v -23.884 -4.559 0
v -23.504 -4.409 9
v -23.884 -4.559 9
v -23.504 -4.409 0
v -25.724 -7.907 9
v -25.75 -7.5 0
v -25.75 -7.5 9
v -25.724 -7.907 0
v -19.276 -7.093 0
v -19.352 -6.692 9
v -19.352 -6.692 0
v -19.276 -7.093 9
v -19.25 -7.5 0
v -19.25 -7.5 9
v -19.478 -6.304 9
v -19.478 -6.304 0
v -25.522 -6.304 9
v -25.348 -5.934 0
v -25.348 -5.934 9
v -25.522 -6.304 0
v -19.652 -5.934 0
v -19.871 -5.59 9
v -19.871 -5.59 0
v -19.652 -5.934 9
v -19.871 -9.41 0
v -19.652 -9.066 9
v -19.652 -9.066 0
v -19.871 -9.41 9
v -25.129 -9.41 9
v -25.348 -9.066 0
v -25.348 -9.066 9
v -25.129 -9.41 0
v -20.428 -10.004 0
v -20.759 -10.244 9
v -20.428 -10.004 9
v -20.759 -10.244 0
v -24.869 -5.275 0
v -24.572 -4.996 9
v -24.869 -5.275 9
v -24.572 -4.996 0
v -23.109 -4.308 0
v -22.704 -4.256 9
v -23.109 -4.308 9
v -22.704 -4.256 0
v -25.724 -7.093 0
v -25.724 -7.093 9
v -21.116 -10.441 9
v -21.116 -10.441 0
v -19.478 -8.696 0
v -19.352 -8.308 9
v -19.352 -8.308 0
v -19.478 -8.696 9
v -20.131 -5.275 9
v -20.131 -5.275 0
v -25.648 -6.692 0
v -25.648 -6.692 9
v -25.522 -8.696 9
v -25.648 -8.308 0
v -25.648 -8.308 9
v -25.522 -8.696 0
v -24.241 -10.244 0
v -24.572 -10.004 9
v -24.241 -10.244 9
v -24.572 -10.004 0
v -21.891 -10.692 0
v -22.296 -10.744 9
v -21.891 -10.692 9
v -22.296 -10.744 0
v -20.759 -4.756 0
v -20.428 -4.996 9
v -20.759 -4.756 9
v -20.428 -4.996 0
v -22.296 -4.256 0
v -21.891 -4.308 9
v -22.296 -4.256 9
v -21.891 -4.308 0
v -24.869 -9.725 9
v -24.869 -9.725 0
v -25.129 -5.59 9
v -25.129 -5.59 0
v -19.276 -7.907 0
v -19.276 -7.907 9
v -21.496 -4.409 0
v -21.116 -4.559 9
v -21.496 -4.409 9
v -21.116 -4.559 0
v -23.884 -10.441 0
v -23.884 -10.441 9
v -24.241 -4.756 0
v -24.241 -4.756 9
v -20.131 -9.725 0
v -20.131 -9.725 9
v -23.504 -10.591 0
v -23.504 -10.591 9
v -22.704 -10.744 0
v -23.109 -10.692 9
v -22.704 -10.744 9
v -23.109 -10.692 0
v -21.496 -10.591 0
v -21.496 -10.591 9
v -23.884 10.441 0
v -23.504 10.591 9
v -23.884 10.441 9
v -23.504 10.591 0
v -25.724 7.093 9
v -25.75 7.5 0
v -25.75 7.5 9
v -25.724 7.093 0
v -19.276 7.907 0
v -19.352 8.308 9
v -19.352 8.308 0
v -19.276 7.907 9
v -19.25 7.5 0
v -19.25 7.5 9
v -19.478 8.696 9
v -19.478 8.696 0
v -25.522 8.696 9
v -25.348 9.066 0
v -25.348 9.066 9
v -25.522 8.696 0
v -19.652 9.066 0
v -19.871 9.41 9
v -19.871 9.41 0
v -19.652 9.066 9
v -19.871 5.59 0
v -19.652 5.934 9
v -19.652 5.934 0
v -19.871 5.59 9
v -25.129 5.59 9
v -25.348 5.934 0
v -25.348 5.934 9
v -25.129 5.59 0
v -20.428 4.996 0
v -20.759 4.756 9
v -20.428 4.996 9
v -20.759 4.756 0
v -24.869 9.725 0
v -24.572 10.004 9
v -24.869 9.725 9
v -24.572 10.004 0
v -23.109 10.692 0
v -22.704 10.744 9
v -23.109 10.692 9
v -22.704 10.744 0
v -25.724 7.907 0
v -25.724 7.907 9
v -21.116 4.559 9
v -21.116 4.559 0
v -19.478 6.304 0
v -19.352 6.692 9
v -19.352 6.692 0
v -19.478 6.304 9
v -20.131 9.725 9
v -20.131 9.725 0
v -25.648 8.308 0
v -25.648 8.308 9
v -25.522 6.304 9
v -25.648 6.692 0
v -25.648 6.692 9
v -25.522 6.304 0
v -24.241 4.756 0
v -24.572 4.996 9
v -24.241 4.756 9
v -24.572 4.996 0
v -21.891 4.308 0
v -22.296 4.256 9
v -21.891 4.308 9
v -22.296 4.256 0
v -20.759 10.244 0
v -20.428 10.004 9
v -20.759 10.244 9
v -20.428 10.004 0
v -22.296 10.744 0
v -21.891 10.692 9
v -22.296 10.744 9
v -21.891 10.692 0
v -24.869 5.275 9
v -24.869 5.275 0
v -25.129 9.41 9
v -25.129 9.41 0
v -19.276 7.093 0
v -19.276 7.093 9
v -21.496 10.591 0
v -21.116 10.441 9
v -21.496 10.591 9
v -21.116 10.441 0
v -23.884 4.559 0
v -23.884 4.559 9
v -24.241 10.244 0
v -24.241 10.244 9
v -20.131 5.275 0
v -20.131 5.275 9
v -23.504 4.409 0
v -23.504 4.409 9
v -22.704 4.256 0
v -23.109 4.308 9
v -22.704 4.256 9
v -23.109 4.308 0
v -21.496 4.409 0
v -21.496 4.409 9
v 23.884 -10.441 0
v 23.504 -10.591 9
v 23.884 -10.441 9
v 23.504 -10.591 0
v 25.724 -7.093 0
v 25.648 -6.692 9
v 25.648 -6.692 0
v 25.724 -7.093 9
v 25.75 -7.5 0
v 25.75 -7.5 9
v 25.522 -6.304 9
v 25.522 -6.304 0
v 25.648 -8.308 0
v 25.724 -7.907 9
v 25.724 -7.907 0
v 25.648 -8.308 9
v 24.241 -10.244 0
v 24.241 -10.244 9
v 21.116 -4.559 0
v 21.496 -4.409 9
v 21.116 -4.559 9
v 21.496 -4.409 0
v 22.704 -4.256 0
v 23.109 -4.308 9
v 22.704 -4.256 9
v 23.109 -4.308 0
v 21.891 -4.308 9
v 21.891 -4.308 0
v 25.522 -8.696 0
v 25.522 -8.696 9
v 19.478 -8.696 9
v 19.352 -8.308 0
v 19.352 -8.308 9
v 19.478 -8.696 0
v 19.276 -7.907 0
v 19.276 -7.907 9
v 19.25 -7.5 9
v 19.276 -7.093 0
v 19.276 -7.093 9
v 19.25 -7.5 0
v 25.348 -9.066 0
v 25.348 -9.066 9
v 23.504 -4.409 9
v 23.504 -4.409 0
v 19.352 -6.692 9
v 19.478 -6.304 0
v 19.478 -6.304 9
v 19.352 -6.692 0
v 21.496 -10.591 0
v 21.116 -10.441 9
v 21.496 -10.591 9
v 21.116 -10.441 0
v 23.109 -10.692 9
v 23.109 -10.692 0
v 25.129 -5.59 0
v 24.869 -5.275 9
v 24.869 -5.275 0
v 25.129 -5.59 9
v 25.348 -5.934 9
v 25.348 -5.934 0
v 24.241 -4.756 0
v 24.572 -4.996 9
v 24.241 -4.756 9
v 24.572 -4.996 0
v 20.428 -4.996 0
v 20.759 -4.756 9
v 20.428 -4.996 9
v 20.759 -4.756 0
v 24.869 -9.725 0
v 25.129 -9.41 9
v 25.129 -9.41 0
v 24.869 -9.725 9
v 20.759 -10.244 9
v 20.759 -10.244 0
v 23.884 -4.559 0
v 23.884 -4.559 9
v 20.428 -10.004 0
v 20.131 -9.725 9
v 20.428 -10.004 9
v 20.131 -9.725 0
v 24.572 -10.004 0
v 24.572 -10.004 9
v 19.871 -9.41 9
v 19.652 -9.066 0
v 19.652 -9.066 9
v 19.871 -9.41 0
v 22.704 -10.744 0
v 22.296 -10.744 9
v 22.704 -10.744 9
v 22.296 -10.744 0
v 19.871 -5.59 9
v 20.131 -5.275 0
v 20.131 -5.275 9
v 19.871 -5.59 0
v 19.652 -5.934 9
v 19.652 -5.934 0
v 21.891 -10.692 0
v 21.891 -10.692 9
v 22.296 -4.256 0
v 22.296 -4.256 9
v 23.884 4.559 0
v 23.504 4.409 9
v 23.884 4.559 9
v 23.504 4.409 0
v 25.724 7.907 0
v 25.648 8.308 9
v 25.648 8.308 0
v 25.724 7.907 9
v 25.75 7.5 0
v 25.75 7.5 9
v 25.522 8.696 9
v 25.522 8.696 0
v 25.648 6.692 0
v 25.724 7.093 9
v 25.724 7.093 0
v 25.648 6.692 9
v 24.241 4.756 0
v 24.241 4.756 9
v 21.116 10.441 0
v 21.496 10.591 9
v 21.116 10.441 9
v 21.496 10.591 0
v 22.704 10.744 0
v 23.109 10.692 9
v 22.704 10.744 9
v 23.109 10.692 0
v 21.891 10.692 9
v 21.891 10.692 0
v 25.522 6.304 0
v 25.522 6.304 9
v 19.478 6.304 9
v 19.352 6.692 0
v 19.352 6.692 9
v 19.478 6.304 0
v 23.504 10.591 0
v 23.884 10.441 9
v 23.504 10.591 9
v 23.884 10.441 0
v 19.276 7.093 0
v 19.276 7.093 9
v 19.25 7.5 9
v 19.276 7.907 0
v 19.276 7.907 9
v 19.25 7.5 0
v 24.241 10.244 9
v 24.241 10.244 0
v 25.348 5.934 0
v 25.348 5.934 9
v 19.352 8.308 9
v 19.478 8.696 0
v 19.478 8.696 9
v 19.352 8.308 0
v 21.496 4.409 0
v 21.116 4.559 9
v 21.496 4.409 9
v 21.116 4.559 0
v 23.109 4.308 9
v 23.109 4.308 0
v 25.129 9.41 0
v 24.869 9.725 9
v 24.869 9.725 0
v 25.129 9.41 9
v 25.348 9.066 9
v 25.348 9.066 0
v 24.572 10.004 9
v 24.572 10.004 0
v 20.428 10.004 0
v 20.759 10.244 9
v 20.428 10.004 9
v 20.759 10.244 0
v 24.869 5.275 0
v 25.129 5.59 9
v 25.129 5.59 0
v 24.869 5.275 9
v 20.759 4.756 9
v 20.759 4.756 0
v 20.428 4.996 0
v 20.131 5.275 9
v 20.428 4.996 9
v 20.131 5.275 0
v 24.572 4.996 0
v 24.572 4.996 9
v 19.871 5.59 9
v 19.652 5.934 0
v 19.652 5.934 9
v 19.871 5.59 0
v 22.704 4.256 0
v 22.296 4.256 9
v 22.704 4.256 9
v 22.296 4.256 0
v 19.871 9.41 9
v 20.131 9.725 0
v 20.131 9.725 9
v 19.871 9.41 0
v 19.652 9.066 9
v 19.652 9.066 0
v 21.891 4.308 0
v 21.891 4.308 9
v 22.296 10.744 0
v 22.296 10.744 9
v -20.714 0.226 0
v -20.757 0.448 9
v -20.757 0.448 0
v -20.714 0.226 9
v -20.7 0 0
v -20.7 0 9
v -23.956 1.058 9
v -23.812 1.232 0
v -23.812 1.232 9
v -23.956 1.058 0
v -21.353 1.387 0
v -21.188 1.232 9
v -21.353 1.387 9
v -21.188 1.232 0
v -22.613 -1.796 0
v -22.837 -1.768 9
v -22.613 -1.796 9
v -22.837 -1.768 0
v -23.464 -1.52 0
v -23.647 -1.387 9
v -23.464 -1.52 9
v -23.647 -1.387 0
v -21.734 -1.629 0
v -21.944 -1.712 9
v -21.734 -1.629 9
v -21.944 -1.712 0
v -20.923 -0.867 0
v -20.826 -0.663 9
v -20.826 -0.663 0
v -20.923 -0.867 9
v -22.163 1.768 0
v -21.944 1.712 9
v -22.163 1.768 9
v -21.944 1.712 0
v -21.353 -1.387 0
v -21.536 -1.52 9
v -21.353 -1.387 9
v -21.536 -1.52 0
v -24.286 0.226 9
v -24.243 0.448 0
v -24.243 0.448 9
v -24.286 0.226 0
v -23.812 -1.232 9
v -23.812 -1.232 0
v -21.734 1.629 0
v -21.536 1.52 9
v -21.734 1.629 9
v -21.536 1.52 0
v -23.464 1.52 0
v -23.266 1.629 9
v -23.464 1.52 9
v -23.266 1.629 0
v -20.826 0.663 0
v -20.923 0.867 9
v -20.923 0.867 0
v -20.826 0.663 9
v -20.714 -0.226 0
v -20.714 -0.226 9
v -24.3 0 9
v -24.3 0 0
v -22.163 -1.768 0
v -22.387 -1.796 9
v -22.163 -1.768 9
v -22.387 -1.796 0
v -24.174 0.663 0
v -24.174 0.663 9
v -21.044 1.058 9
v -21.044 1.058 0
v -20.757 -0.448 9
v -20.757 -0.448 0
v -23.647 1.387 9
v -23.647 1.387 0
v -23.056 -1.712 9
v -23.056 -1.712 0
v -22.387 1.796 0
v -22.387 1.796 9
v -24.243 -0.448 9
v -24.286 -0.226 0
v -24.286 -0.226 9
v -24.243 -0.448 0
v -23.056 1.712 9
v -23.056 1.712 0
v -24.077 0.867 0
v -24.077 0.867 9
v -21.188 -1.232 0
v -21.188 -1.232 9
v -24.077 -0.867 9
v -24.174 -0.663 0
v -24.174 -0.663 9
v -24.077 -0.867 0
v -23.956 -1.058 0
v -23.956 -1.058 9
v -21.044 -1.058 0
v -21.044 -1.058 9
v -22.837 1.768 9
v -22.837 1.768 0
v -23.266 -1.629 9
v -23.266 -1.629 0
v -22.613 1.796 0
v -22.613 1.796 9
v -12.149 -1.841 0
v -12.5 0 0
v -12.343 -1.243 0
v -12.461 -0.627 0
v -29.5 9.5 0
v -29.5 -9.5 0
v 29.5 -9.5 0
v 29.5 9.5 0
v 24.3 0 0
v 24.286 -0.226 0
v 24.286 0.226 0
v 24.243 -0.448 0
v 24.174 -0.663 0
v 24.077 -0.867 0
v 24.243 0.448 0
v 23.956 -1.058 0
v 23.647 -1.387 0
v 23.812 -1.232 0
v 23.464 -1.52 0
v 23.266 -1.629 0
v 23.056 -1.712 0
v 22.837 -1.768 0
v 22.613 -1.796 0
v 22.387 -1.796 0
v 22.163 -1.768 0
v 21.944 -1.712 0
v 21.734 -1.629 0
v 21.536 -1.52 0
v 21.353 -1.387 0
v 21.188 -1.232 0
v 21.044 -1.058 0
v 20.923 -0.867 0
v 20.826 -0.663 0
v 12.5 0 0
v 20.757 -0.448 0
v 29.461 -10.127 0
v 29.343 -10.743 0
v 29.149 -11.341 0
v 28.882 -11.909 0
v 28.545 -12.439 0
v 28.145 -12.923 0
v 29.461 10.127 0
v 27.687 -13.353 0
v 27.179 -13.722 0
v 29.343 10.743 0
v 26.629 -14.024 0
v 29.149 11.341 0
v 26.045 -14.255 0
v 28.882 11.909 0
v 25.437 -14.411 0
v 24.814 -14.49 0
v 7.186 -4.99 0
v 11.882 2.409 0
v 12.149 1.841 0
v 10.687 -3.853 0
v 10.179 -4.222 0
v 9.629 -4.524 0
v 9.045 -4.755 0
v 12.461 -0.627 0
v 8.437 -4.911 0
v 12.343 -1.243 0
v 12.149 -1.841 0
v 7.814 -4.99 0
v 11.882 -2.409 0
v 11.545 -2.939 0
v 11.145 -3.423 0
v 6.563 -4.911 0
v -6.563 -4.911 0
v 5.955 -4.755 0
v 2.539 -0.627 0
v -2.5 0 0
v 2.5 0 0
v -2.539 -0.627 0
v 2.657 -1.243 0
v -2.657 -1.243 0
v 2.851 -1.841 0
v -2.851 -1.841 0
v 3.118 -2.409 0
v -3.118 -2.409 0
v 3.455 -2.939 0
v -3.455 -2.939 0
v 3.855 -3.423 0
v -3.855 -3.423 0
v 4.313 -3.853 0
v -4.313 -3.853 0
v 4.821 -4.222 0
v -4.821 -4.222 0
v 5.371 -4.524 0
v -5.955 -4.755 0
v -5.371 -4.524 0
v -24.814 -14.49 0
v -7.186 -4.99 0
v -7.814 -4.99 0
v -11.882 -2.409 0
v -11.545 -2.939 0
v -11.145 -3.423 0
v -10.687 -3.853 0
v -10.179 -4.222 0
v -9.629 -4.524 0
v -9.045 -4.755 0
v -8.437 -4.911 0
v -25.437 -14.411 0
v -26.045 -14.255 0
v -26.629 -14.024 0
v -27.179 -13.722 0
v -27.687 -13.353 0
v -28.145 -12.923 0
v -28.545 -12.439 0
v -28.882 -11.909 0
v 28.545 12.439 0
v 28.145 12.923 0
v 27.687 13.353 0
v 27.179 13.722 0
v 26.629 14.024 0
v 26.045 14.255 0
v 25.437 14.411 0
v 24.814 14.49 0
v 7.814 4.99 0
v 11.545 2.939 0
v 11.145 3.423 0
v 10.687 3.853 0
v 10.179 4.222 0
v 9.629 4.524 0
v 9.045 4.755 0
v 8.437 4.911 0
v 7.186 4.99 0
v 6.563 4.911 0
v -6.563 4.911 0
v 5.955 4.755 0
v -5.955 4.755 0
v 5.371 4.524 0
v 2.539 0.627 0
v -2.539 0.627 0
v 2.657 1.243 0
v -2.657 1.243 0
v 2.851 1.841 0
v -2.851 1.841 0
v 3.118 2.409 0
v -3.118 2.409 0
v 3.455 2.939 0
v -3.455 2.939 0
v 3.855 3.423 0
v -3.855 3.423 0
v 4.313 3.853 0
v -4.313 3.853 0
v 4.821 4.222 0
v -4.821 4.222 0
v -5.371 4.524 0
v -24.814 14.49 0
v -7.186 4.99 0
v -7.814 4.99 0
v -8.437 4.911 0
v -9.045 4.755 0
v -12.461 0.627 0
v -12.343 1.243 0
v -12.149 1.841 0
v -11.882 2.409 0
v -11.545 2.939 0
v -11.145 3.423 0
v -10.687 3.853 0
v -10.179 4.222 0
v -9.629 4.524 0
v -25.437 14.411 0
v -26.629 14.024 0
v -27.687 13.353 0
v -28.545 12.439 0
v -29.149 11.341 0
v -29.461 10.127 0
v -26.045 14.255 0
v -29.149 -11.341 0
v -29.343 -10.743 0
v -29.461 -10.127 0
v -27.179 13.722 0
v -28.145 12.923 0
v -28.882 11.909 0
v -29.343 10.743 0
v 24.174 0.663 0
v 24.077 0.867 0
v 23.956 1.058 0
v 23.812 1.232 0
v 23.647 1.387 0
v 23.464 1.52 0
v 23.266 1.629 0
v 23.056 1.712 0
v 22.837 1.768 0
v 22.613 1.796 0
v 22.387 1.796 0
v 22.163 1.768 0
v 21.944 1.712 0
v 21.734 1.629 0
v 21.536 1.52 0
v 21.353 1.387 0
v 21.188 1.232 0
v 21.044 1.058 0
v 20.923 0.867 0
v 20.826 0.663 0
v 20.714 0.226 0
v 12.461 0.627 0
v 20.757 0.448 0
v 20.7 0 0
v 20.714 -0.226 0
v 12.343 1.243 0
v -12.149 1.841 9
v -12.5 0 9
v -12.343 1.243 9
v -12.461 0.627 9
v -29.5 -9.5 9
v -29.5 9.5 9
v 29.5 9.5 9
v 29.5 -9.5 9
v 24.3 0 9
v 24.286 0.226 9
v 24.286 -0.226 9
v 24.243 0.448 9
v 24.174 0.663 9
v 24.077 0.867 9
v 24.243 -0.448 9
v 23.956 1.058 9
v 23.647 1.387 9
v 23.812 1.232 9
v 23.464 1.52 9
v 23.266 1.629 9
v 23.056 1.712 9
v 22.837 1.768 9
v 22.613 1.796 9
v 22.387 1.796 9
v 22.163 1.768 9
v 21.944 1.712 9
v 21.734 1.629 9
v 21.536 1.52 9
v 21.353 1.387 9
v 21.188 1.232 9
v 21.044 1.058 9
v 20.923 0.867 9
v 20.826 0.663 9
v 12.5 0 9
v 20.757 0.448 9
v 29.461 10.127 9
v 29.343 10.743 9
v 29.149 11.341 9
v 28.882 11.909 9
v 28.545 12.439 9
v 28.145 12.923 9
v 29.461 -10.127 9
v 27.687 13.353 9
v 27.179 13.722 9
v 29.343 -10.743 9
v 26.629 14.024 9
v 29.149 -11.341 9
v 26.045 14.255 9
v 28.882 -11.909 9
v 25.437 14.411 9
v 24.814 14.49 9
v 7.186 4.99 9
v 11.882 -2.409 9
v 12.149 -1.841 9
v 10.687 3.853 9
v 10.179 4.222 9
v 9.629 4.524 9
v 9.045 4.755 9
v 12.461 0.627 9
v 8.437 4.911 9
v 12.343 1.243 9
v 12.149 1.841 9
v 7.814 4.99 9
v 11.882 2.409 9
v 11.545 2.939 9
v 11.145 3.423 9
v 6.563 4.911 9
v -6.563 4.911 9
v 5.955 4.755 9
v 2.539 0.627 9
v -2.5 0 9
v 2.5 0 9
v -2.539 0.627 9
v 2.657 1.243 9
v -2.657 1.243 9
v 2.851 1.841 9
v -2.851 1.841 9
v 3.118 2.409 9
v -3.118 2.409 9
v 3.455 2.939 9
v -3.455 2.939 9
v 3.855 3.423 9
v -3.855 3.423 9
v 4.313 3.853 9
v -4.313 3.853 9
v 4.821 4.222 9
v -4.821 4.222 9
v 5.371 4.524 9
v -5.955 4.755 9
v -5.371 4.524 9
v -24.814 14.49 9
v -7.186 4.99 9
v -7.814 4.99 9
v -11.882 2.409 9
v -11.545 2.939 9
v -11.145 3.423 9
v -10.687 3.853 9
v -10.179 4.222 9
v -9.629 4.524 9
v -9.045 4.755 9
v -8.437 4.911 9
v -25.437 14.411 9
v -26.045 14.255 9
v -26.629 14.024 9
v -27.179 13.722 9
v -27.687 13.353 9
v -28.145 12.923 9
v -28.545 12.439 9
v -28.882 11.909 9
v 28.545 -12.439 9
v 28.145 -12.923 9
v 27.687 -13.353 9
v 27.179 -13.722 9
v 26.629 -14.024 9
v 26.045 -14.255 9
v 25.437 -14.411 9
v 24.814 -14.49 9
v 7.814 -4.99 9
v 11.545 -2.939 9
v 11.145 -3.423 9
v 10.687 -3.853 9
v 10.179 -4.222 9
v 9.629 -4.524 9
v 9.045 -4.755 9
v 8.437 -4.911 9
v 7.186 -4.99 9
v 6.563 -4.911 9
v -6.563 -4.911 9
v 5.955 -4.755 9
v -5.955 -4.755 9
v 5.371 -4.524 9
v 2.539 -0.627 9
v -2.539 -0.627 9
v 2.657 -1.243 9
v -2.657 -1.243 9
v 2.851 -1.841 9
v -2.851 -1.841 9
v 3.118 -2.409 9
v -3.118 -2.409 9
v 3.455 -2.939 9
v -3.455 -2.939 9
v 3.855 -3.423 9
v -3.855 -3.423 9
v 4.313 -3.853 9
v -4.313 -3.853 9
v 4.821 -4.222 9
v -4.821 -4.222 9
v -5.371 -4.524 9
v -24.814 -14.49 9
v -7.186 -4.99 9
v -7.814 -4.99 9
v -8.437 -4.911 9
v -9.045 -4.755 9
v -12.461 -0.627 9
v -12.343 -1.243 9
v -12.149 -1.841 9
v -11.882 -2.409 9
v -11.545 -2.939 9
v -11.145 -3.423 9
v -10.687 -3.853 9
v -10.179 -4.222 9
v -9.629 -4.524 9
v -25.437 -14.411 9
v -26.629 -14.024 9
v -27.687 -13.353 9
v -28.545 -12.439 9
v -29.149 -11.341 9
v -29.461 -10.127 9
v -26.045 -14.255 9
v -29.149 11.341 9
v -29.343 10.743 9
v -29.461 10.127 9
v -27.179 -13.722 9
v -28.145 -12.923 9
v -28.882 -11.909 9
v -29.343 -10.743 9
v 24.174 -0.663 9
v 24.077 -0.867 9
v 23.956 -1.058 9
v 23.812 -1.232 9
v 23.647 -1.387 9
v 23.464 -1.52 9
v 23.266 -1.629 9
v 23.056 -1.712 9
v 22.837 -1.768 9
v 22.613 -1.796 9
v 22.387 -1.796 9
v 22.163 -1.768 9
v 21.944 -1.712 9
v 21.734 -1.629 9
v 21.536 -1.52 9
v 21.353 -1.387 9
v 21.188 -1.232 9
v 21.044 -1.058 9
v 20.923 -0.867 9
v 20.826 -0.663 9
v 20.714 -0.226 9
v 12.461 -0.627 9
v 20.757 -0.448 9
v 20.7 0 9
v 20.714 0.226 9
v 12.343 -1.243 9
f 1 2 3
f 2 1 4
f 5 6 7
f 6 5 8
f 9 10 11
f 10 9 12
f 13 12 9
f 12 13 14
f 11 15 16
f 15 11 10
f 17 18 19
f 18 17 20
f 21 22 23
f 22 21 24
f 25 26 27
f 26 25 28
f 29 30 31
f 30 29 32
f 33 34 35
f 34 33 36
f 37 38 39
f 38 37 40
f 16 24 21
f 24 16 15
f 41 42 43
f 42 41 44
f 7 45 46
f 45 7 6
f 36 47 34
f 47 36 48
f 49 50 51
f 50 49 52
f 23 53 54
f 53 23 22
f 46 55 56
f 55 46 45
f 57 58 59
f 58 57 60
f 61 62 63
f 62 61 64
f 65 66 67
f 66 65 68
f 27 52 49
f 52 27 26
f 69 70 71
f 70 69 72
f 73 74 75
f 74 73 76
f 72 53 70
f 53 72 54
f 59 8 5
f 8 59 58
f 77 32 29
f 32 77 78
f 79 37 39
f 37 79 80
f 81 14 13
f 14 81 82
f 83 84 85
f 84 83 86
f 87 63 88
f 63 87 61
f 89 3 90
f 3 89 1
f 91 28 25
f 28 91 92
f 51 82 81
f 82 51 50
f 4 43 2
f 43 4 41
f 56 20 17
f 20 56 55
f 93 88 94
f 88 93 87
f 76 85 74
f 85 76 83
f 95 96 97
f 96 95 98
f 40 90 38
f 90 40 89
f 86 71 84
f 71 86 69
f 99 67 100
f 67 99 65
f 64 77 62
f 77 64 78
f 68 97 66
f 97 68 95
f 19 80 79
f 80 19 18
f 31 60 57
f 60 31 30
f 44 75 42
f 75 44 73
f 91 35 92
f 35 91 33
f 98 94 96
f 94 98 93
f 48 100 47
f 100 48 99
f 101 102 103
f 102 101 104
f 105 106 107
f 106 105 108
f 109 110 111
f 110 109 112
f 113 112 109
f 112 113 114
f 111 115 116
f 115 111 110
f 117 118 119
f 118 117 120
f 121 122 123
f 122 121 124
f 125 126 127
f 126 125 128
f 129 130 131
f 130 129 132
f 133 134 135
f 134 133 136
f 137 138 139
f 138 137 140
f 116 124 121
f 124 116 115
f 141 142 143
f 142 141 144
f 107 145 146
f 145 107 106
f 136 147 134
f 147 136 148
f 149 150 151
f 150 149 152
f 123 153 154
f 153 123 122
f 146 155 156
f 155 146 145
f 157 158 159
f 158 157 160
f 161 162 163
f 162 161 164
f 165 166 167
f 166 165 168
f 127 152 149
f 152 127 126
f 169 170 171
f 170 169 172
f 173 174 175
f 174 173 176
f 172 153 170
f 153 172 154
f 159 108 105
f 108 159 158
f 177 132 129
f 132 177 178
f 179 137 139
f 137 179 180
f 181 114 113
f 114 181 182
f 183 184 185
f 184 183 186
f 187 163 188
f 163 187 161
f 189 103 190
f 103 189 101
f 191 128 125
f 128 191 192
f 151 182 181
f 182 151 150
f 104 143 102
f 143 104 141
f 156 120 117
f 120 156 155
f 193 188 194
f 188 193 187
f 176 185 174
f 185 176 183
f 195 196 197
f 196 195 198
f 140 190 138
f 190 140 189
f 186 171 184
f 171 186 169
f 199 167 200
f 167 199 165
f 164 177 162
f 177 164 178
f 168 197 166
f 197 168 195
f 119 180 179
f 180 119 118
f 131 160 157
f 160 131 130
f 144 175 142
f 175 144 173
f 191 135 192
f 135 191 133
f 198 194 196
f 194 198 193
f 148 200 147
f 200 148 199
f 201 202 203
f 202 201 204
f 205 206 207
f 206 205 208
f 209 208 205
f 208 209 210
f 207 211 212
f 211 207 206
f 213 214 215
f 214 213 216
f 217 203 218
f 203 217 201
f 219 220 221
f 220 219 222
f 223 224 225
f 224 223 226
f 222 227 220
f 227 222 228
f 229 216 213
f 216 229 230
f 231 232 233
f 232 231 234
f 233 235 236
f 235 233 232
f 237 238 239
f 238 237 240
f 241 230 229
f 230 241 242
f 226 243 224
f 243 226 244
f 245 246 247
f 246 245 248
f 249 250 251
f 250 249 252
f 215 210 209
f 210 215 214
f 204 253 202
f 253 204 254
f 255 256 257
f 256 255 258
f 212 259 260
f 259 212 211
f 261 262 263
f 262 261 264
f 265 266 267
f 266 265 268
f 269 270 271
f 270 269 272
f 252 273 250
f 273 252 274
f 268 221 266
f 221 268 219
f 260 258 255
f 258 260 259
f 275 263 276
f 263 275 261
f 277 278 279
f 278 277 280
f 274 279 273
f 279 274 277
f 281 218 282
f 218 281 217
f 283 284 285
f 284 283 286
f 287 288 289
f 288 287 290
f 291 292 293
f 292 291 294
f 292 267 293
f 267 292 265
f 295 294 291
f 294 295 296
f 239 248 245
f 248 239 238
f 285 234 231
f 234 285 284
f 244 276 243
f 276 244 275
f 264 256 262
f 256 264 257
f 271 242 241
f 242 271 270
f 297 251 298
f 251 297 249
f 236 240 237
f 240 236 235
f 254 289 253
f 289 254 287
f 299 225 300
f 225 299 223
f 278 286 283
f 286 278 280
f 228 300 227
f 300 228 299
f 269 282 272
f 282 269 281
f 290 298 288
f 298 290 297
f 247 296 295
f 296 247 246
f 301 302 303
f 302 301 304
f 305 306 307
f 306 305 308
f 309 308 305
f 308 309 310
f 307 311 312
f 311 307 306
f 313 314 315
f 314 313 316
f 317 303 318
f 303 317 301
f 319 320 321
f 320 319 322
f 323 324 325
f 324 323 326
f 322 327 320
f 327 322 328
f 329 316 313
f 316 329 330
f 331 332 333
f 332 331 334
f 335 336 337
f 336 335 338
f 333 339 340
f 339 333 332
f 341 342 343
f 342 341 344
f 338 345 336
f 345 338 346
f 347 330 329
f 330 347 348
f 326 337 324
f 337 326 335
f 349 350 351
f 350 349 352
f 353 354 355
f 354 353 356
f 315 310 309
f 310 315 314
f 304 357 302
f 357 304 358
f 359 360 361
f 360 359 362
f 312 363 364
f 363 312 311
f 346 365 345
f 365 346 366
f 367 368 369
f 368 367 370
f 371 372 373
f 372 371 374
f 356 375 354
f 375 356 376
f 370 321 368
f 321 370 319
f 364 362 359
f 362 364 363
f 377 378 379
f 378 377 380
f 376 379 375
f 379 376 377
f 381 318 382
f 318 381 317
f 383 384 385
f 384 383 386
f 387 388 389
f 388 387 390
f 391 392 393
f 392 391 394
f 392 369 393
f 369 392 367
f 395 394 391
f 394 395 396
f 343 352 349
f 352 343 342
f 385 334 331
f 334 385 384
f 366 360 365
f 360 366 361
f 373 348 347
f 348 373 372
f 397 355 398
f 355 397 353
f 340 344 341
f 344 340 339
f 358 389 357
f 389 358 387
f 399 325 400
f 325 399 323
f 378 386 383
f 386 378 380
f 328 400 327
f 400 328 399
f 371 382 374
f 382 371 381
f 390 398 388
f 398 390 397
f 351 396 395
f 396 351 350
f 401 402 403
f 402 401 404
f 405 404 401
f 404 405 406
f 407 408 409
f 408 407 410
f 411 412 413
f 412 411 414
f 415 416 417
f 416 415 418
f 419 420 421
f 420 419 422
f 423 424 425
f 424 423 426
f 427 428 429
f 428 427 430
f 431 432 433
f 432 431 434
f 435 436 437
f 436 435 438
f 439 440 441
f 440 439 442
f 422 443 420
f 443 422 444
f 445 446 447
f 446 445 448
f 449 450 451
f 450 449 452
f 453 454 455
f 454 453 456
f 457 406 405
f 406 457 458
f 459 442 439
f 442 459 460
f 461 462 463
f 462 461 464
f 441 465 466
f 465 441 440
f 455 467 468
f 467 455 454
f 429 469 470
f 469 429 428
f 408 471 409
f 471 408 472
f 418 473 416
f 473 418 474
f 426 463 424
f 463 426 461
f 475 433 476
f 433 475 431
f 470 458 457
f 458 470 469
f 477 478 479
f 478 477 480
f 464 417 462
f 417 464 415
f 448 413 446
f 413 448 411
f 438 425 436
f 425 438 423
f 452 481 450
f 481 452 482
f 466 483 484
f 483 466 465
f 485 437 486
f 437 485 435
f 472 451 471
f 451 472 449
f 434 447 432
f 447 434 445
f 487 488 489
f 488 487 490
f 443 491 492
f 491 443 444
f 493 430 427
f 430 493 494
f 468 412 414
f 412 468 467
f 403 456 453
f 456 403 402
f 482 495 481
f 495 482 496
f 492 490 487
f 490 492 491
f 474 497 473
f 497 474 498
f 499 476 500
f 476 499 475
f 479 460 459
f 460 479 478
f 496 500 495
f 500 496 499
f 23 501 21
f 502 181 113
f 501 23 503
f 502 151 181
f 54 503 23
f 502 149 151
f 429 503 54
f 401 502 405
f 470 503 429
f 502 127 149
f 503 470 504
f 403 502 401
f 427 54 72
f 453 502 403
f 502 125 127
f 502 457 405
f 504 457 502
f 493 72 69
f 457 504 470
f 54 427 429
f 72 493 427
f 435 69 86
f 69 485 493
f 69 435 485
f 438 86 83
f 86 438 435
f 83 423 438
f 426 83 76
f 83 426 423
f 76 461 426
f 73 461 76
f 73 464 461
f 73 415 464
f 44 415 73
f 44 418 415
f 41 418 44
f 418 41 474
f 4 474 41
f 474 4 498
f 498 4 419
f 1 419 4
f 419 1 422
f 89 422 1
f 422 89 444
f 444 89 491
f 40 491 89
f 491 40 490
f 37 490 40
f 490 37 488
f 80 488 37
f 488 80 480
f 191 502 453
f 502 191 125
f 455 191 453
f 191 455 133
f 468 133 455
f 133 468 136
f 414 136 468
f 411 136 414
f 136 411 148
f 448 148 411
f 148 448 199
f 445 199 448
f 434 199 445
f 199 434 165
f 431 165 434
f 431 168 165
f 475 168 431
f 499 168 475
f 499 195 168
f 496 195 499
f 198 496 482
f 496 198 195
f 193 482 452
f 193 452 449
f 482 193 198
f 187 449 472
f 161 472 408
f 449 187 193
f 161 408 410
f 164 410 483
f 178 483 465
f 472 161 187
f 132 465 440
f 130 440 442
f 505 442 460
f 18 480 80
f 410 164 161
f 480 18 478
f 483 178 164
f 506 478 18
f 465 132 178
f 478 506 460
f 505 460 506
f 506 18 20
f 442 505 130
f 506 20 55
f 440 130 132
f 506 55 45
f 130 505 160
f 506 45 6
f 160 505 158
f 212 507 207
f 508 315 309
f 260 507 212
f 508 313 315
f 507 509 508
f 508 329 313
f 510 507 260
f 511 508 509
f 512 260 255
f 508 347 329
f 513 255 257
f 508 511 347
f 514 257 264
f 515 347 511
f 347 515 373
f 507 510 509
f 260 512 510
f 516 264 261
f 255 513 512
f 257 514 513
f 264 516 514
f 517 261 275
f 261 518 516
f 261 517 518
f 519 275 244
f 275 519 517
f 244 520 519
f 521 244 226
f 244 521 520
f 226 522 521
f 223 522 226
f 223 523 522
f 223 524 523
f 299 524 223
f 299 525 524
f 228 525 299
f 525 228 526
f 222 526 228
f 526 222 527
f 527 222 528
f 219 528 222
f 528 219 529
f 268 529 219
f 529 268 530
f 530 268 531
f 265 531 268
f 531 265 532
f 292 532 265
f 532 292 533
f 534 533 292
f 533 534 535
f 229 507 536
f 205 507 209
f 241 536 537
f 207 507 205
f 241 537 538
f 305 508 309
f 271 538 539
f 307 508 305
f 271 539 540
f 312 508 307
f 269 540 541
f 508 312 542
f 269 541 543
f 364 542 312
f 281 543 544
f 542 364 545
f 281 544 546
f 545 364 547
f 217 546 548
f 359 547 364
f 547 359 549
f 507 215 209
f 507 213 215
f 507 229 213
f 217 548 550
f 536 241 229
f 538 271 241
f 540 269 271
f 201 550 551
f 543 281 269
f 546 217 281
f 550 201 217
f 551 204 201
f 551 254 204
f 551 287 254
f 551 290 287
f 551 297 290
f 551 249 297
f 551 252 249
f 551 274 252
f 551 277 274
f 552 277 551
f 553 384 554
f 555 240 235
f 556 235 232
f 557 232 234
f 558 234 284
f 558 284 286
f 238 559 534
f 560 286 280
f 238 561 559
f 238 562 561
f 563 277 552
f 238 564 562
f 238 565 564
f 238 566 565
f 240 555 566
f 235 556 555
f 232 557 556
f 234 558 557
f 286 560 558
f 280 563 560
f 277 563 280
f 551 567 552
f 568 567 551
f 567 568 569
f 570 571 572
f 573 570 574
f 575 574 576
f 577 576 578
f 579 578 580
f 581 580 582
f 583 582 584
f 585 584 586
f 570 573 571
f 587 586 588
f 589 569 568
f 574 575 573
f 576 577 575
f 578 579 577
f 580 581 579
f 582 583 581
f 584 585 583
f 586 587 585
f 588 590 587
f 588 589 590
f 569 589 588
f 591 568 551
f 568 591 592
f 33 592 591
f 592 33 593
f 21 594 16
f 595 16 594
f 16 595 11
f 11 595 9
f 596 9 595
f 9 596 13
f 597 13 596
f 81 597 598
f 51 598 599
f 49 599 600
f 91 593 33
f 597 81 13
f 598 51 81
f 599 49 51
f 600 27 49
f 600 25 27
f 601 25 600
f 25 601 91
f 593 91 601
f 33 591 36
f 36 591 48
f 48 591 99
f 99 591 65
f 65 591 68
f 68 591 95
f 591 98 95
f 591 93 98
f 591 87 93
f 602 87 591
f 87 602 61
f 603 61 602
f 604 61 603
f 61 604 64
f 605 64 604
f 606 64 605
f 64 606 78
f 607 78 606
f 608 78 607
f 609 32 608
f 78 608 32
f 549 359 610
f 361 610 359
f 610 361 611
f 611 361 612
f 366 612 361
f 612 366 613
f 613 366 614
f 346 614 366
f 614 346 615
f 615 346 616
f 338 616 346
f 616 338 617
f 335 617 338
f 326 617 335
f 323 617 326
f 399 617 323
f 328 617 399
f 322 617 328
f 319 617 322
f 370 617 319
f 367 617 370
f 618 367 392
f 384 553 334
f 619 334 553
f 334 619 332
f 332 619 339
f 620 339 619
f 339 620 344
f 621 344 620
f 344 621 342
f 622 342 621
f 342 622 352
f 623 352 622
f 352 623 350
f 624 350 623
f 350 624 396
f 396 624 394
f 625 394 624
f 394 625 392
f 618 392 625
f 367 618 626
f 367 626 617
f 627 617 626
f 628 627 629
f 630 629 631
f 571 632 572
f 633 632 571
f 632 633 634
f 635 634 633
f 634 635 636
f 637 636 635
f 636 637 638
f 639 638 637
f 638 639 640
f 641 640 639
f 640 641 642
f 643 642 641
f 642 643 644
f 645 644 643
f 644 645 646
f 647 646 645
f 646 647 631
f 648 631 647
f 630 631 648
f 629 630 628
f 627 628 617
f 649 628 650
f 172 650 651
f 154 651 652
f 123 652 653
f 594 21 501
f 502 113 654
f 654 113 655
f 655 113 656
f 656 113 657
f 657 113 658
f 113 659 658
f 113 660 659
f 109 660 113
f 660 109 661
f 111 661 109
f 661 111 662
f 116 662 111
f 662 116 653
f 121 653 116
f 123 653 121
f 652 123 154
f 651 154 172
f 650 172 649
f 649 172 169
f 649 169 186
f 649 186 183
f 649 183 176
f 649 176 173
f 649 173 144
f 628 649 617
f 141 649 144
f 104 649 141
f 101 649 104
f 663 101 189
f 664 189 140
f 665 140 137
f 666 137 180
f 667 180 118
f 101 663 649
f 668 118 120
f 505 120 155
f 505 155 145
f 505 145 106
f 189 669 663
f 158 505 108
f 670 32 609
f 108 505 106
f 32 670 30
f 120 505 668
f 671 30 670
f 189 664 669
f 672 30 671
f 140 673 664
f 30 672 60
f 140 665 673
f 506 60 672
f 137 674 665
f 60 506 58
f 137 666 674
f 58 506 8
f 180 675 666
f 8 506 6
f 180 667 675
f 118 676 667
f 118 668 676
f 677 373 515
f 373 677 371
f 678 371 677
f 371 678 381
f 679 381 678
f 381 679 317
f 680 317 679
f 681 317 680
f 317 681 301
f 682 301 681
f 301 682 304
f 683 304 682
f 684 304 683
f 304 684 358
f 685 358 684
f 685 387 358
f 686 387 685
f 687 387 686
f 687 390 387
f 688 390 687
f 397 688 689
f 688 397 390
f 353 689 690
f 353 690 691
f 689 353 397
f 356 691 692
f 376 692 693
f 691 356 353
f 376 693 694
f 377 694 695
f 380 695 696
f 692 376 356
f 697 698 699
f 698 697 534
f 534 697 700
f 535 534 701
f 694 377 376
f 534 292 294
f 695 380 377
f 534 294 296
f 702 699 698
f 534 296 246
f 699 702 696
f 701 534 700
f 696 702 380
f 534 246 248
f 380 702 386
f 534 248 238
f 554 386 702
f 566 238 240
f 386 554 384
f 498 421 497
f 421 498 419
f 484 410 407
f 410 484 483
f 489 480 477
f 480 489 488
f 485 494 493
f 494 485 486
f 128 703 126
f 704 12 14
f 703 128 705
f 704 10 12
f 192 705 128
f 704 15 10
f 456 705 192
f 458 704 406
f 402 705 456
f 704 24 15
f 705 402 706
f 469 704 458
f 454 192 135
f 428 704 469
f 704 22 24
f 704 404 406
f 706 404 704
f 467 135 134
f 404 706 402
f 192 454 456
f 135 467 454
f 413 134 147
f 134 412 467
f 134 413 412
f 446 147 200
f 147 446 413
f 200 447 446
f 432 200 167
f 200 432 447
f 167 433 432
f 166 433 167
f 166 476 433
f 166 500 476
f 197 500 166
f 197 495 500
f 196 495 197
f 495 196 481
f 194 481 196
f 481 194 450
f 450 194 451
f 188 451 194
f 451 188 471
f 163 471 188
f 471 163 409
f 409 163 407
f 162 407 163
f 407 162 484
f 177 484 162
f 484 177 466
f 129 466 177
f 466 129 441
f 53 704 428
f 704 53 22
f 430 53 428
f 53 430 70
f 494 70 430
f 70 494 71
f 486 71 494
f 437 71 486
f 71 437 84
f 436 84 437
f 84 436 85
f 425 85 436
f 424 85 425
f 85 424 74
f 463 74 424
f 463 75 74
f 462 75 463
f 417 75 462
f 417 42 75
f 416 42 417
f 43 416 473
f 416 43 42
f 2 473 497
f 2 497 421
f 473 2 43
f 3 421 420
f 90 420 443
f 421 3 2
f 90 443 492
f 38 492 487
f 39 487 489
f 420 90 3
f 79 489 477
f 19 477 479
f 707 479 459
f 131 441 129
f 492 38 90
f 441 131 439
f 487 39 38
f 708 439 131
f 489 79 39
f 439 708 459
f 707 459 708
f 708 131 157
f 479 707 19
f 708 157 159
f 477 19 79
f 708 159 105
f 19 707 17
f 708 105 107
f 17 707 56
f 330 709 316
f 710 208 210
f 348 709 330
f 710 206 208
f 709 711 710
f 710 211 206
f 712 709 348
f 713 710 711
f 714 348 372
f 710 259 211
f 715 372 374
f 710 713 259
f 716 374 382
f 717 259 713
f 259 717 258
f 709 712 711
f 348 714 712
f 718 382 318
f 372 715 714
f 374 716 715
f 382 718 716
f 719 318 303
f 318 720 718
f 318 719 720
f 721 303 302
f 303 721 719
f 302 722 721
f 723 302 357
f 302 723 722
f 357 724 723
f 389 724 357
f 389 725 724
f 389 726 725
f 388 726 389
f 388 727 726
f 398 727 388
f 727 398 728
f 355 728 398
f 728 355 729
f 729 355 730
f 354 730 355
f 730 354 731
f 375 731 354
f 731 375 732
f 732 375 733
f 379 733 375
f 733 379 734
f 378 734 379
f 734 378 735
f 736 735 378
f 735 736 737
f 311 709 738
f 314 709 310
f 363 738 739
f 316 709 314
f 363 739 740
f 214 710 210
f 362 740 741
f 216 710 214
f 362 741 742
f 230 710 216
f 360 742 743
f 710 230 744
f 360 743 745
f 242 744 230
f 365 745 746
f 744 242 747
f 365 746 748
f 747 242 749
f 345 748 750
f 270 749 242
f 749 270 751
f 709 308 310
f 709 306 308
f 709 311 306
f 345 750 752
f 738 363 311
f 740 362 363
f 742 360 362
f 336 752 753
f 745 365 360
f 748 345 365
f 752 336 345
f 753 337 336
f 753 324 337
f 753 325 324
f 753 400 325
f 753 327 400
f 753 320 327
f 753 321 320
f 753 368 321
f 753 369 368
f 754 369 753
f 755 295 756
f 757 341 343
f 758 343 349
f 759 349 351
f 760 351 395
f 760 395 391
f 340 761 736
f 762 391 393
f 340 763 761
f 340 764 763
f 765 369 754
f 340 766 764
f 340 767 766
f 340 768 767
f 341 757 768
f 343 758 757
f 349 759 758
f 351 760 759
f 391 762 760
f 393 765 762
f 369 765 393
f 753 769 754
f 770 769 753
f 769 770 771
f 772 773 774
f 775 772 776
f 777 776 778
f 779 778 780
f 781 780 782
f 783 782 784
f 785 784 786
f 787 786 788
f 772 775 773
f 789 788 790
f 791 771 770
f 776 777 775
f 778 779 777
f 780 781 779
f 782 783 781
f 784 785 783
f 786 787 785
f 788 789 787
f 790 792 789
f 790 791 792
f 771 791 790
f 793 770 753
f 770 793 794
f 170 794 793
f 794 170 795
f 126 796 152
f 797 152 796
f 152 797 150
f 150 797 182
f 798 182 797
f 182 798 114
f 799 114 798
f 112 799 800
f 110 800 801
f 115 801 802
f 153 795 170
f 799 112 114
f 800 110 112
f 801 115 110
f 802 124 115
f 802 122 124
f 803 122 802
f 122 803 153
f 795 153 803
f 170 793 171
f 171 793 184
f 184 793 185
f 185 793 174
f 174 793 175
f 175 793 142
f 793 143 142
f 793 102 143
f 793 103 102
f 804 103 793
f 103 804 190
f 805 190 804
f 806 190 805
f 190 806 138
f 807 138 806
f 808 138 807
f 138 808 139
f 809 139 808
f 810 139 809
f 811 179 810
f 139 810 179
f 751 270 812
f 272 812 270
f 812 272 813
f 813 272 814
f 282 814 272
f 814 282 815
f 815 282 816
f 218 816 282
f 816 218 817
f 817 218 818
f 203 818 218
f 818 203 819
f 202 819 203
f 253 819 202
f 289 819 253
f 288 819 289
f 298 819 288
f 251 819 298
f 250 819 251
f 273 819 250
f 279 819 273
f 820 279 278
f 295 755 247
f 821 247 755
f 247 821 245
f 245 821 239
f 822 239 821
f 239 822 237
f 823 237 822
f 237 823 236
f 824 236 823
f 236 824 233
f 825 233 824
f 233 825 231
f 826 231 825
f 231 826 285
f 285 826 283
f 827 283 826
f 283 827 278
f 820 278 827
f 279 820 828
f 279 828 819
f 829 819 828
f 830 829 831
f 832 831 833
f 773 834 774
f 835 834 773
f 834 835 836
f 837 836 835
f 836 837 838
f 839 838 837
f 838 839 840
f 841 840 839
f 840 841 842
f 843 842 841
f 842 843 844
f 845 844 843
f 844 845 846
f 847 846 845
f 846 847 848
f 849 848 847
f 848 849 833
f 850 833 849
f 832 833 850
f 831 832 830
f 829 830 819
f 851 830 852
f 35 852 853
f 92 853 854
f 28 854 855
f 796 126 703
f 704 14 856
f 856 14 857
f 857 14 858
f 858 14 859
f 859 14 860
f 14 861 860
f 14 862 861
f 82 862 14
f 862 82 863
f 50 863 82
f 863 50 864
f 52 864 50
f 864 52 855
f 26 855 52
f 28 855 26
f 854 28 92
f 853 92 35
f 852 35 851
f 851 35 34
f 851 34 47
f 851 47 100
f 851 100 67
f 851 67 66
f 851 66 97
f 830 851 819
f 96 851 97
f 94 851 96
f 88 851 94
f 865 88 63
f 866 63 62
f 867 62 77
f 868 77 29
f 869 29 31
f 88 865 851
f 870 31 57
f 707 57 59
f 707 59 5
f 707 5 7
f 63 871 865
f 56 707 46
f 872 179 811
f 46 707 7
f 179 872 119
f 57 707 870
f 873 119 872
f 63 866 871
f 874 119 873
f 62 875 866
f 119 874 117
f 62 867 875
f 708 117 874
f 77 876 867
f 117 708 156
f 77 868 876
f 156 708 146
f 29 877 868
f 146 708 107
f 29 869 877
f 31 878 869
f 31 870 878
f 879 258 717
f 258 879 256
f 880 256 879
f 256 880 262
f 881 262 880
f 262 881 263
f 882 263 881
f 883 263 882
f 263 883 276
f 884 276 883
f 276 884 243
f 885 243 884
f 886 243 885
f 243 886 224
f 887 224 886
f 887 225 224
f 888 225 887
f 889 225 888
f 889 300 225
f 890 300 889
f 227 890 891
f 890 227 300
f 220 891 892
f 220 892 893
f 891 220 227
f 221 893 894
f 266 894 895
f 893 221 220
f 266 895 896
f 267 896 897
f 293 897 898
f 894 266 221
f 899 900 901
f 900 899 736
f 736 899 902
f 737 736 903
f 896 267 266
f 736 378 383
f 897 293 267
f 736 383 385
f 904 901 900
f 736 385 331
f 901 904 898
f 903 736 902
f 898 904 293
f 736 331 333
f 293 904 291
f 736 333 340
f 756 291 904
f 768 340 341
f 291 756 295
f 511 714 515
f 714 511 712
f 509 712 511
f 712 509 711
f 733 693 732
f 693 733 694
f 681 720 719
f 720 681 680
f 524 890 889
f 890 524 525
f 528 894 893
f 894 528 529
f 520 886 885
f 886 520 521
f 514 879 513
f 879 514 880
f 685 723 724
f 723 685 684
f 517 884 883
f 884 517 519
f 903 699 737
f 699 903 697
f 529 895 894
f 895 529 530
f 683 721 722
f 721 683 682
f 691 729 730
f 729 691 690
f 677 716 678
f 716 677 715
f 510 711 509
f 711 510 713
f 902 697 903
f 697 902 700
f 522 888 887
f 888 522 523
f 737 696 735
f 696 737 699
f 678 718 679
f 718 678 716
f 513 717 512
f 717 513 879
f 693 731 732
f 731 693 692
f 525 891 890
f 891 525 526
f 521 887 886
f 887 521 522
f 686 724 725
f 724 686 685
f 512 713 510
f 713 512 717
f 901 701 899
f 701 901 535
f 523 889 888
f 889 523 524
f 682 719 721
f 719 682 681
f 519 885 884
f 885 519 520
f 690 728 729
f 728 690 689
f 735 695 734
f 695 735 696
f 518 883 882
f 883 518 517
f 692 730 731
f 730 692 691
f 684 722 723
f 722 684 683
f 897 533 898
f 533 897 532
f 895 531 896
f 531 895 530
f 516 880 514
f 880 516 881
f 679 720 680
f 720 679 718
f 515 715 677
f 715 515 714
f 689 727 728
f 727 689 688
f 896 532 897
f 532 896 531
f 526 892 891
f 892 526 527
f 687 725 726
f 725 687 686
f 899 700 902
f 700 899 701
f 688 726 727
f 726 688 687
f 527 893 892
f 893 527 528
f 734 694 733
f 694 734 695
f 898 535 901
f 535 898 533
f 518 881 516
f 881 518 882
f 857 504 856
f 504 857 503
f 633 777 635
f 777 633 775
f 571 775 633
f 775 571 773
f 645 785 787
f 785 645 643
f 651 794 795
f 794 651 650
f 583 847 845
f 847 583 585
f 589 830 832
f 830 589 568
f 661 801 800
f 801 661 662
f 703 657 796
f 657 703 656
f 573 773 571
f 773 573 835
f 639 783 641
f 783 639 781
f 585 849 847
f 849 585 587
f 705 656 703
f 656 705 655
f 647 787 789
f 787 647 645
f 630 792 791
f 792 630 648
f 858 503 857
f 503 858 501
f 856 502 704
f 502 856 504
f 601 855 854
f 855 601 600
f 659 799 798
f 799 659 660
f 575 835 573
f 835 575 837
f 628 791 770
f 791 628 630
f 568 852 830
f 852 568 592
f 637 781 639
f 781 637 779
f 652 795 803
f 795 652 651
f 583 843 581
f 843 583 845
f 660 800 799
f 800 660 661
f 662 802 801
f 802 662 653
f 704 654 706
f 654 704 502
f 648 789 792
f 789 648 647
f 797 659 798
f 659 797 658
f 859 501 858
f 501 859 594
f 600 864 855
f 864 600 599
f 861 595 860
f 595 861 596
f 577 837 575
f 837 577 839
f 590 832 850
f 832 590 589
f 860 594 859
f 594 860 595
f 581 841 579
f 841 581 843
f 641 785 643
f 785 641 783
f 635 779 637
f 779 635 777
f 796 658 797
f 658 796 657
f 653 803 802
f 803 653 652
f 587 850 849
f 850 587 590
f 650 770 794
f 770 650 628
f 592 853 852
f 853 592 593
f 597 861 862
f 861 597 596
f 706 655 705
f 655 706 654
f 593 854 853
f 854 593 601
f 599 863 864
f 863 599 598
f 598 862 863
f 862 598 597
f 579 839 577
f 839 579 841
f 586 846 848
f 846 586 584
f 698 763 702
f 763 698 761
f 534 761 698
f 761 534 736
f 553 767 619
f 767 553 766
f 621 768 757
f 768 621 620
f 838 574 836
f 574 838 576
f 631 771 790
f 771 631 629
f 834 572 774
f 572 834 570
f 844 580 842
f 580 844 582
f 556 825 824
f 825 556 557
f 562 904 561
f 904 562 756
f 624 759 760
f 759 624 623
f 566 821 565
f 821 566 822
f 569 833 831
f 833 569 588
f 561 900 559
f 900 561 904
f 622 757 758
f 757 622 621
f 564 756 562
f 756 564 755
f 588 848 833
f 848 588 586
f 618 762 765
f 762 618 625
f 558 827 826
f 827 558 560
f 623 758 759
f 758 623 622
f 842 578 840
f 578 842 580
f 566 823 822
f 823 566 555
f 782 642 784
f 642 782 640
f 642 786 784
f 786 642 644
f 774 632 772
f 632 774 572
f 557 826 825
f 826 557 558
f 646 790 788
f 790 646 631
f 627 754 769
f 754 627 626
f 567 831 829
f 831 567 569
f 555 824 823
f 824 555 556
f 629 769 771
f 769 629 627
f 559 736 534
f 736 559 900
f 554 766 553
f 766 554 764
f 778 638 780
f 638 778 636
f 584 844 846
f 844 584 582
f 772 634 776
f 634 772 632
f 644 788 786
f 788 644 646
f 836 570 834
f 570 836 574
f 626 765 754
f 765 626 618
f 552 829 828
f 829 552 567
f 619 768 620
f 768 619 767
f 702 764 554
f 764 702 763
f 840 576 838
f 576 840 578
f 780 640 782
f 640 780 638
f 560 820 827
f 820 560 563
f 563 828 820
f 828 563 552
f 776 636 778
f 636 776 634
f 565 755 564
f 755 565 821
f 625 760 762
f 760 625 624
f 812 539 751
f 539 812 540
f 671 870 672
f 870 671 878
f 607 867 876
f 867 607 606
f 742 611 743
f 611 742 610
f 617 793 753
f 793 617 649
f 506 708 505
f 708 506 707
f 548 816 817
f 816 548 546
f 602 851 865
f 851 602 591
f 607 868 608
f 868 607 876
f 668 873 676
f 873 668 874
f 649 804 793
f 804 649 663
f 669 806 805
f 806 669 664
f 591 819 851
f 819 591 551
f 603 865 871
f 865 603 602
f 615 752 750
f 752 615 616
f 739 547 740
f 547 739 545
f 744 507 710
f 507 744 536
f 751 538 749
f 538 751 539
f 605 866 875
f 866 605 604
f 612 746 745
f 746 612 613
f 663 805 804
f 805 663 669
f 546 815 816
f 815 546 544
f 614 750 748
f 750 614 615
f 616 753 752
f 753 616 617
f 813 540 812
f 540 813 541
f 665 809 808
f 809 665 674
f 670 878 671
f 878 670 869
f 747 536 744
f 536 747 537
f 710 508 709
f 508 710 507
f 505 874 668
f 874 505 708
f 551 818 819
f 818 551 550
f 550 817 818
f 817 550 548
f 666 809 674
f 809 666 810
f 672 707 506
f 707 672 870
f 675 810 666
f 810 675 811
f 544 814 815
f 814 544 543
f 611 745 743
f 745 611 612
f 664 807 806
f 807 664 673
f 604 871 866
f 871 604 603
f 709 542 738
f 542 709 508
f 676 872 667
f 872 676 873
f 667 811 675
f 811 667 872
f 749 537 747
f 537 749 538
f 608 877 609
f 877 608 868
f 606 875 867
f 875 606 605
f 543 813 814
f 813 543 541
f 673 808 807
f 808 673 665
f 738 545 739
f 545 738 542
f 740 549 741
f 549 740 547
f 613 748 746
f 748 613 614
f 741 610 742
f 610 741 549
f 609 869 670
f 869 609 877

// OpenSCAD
$fn = 50;


difference() {
	union() {
		hull() {
			translate(v = [-24.5000000000, 9.5000000000, 0]) {
				cylinder(h = 9, r = 5);
			}
			translate(v = [24.5000000000, 9.5000000000, 0]) {
				cylinder(h = 9, r = 5);
			}
			translate(v = [-24.5000000000, -9.5000000000, 0]) {
				cylinder(h = 9, r = 5);
			}
			translate(v = [24.5000000000, -9.5000000000, 0]) {
				cylinder(h = 9, r = 5);
			}
		}
	}
	union() {
		#translate(v = [-22.5000000000, -7.5000000000, 0]) {
			cylinder(h = 9, r = 3.2500000000);
		}
		#translate(v = [-22.5000000000, 7.5000000000, 0]) {
			cylinder(h = 9, r = 3.2500000000);
		}
		#translate(v = [22.5000000000, -7.5000000000, 0]) {
			cylinder(h = 9, r = 3.2500000000);
		}
		#translate(v = [22.5000000000, 7.5000000000, 0]) {
			cylinder(h = 9, r = 3.2500000000);
		}
		#translate(v = [-22.5000000000, -7.5000000000, -100.0000000000]) {
			cylinder(h = 200, r = 3.2500000000);
		}
		#translate(v = [-22.5000000000, 7.5000000000, -100.0000000000]) {
			cylinder(h = 200, r = 3.2500000000);
		}
		#translate(v = [22.5000000000, -7.5000000000, -100.0000000000]) {
			cylinder(h = 200, r = 3.2500000000);
		}
		#translate(v = [22.5000000000, 7.5000000000, -100.0000000000]) {
			cylinder(h = 200, r = 3.2500000000);
		}
		#translate(v = [-22.5000000000, -7.5000000000, 0]) {
			cylinder(h = 9, r = 1.8000000000);
		}
		#translate(v = [-22.5000000000, 0.0000000000, 0]) {
			cylinder(h = 9, r = 1.8000000000);
		}
		#translate(v = [-22.5000000000, 7.5000000000, 0]) {
			cylinder(h = 9, r = 1.8000000000);
		}
		#translate(v = [22.5000000000, -7.5000000000, 0]) {
			cylinder(h = 9, r = 1.8000000000);
		}
		#translate(v = [22.5000000000, 0.0000000000, 0]) {
			cylinder(h = 9, r = 1.8000000000);
		}
		#translate(v = [22.5000000000, 7.5000000000, 0]) {
			cylinder(h = 9, r = 1.8000000000);
		}
		#translate(v = [-22.5000000000, -7.5000000000, 0]) {
			cylinder(h = 9, r = 1.8000000000);
		}
		#translate(v = [-22.5000000000, 0.0000000000, 0]) {
			cylinder(h = 9, r = 1.8000000000);
		}
		#translate(v = [-22.5000000000, 7.5000000000, 0]) {
			cylinder(h = 9, r = 1.8000000000);
		}
		#translate(v = [22.5000000000, -7.5000000000, 0]) {
			cylinder(h = 9, r = 1.8000000000);
		}
		#translate(v = [22.5000000000, 0.0000000000, 0]) {
			cylinder(h = 9, r = 1.8000000000);
		}
		#translate(v = [22.5000000000, 7.5000000000, 0]) {
			cylinder(h = 9, r = 1.8000000000);
		}
		#translate(v = [-22.5000000000, -7.5000000000, 0]) {
			cylinder(h = 9, r = 1.8000000000);
		}
		#translate(v = [-22.5000000000, 0.0000000000, 0]) {
			cylinder(h = 9, r = 1.8000000000);
		}
		#translate(v = [-22.5000000000, 7.5000000000, 0]) {
			cylinder(h = 9, r = 1.8000000000);
		}
		#translate(v = [22.5000000000, -7.5000000000, 0]) {
			cylinder(h = 9, r = 1.8000000000);
		}
		#translate(v = [22.5000000000, 0.0000000000, 0]) {
			cylinder(h = 9, r = 1.8000000000);
		}
		#translate(v = [22.5000000000, 7.5000000000, 0]) {
			cylinder(h = 9, r = 1.8000000000);
		}
		#translate(v = [-7.5000000000, 0, 0]) {
			cylinder(h = 9, r = 5.0000000000);
		}
		#translate(v = [7.5000000000, 0, 0]) {
			cylinder(h = 9, r = 5.0000000000);
		}
	}
}
